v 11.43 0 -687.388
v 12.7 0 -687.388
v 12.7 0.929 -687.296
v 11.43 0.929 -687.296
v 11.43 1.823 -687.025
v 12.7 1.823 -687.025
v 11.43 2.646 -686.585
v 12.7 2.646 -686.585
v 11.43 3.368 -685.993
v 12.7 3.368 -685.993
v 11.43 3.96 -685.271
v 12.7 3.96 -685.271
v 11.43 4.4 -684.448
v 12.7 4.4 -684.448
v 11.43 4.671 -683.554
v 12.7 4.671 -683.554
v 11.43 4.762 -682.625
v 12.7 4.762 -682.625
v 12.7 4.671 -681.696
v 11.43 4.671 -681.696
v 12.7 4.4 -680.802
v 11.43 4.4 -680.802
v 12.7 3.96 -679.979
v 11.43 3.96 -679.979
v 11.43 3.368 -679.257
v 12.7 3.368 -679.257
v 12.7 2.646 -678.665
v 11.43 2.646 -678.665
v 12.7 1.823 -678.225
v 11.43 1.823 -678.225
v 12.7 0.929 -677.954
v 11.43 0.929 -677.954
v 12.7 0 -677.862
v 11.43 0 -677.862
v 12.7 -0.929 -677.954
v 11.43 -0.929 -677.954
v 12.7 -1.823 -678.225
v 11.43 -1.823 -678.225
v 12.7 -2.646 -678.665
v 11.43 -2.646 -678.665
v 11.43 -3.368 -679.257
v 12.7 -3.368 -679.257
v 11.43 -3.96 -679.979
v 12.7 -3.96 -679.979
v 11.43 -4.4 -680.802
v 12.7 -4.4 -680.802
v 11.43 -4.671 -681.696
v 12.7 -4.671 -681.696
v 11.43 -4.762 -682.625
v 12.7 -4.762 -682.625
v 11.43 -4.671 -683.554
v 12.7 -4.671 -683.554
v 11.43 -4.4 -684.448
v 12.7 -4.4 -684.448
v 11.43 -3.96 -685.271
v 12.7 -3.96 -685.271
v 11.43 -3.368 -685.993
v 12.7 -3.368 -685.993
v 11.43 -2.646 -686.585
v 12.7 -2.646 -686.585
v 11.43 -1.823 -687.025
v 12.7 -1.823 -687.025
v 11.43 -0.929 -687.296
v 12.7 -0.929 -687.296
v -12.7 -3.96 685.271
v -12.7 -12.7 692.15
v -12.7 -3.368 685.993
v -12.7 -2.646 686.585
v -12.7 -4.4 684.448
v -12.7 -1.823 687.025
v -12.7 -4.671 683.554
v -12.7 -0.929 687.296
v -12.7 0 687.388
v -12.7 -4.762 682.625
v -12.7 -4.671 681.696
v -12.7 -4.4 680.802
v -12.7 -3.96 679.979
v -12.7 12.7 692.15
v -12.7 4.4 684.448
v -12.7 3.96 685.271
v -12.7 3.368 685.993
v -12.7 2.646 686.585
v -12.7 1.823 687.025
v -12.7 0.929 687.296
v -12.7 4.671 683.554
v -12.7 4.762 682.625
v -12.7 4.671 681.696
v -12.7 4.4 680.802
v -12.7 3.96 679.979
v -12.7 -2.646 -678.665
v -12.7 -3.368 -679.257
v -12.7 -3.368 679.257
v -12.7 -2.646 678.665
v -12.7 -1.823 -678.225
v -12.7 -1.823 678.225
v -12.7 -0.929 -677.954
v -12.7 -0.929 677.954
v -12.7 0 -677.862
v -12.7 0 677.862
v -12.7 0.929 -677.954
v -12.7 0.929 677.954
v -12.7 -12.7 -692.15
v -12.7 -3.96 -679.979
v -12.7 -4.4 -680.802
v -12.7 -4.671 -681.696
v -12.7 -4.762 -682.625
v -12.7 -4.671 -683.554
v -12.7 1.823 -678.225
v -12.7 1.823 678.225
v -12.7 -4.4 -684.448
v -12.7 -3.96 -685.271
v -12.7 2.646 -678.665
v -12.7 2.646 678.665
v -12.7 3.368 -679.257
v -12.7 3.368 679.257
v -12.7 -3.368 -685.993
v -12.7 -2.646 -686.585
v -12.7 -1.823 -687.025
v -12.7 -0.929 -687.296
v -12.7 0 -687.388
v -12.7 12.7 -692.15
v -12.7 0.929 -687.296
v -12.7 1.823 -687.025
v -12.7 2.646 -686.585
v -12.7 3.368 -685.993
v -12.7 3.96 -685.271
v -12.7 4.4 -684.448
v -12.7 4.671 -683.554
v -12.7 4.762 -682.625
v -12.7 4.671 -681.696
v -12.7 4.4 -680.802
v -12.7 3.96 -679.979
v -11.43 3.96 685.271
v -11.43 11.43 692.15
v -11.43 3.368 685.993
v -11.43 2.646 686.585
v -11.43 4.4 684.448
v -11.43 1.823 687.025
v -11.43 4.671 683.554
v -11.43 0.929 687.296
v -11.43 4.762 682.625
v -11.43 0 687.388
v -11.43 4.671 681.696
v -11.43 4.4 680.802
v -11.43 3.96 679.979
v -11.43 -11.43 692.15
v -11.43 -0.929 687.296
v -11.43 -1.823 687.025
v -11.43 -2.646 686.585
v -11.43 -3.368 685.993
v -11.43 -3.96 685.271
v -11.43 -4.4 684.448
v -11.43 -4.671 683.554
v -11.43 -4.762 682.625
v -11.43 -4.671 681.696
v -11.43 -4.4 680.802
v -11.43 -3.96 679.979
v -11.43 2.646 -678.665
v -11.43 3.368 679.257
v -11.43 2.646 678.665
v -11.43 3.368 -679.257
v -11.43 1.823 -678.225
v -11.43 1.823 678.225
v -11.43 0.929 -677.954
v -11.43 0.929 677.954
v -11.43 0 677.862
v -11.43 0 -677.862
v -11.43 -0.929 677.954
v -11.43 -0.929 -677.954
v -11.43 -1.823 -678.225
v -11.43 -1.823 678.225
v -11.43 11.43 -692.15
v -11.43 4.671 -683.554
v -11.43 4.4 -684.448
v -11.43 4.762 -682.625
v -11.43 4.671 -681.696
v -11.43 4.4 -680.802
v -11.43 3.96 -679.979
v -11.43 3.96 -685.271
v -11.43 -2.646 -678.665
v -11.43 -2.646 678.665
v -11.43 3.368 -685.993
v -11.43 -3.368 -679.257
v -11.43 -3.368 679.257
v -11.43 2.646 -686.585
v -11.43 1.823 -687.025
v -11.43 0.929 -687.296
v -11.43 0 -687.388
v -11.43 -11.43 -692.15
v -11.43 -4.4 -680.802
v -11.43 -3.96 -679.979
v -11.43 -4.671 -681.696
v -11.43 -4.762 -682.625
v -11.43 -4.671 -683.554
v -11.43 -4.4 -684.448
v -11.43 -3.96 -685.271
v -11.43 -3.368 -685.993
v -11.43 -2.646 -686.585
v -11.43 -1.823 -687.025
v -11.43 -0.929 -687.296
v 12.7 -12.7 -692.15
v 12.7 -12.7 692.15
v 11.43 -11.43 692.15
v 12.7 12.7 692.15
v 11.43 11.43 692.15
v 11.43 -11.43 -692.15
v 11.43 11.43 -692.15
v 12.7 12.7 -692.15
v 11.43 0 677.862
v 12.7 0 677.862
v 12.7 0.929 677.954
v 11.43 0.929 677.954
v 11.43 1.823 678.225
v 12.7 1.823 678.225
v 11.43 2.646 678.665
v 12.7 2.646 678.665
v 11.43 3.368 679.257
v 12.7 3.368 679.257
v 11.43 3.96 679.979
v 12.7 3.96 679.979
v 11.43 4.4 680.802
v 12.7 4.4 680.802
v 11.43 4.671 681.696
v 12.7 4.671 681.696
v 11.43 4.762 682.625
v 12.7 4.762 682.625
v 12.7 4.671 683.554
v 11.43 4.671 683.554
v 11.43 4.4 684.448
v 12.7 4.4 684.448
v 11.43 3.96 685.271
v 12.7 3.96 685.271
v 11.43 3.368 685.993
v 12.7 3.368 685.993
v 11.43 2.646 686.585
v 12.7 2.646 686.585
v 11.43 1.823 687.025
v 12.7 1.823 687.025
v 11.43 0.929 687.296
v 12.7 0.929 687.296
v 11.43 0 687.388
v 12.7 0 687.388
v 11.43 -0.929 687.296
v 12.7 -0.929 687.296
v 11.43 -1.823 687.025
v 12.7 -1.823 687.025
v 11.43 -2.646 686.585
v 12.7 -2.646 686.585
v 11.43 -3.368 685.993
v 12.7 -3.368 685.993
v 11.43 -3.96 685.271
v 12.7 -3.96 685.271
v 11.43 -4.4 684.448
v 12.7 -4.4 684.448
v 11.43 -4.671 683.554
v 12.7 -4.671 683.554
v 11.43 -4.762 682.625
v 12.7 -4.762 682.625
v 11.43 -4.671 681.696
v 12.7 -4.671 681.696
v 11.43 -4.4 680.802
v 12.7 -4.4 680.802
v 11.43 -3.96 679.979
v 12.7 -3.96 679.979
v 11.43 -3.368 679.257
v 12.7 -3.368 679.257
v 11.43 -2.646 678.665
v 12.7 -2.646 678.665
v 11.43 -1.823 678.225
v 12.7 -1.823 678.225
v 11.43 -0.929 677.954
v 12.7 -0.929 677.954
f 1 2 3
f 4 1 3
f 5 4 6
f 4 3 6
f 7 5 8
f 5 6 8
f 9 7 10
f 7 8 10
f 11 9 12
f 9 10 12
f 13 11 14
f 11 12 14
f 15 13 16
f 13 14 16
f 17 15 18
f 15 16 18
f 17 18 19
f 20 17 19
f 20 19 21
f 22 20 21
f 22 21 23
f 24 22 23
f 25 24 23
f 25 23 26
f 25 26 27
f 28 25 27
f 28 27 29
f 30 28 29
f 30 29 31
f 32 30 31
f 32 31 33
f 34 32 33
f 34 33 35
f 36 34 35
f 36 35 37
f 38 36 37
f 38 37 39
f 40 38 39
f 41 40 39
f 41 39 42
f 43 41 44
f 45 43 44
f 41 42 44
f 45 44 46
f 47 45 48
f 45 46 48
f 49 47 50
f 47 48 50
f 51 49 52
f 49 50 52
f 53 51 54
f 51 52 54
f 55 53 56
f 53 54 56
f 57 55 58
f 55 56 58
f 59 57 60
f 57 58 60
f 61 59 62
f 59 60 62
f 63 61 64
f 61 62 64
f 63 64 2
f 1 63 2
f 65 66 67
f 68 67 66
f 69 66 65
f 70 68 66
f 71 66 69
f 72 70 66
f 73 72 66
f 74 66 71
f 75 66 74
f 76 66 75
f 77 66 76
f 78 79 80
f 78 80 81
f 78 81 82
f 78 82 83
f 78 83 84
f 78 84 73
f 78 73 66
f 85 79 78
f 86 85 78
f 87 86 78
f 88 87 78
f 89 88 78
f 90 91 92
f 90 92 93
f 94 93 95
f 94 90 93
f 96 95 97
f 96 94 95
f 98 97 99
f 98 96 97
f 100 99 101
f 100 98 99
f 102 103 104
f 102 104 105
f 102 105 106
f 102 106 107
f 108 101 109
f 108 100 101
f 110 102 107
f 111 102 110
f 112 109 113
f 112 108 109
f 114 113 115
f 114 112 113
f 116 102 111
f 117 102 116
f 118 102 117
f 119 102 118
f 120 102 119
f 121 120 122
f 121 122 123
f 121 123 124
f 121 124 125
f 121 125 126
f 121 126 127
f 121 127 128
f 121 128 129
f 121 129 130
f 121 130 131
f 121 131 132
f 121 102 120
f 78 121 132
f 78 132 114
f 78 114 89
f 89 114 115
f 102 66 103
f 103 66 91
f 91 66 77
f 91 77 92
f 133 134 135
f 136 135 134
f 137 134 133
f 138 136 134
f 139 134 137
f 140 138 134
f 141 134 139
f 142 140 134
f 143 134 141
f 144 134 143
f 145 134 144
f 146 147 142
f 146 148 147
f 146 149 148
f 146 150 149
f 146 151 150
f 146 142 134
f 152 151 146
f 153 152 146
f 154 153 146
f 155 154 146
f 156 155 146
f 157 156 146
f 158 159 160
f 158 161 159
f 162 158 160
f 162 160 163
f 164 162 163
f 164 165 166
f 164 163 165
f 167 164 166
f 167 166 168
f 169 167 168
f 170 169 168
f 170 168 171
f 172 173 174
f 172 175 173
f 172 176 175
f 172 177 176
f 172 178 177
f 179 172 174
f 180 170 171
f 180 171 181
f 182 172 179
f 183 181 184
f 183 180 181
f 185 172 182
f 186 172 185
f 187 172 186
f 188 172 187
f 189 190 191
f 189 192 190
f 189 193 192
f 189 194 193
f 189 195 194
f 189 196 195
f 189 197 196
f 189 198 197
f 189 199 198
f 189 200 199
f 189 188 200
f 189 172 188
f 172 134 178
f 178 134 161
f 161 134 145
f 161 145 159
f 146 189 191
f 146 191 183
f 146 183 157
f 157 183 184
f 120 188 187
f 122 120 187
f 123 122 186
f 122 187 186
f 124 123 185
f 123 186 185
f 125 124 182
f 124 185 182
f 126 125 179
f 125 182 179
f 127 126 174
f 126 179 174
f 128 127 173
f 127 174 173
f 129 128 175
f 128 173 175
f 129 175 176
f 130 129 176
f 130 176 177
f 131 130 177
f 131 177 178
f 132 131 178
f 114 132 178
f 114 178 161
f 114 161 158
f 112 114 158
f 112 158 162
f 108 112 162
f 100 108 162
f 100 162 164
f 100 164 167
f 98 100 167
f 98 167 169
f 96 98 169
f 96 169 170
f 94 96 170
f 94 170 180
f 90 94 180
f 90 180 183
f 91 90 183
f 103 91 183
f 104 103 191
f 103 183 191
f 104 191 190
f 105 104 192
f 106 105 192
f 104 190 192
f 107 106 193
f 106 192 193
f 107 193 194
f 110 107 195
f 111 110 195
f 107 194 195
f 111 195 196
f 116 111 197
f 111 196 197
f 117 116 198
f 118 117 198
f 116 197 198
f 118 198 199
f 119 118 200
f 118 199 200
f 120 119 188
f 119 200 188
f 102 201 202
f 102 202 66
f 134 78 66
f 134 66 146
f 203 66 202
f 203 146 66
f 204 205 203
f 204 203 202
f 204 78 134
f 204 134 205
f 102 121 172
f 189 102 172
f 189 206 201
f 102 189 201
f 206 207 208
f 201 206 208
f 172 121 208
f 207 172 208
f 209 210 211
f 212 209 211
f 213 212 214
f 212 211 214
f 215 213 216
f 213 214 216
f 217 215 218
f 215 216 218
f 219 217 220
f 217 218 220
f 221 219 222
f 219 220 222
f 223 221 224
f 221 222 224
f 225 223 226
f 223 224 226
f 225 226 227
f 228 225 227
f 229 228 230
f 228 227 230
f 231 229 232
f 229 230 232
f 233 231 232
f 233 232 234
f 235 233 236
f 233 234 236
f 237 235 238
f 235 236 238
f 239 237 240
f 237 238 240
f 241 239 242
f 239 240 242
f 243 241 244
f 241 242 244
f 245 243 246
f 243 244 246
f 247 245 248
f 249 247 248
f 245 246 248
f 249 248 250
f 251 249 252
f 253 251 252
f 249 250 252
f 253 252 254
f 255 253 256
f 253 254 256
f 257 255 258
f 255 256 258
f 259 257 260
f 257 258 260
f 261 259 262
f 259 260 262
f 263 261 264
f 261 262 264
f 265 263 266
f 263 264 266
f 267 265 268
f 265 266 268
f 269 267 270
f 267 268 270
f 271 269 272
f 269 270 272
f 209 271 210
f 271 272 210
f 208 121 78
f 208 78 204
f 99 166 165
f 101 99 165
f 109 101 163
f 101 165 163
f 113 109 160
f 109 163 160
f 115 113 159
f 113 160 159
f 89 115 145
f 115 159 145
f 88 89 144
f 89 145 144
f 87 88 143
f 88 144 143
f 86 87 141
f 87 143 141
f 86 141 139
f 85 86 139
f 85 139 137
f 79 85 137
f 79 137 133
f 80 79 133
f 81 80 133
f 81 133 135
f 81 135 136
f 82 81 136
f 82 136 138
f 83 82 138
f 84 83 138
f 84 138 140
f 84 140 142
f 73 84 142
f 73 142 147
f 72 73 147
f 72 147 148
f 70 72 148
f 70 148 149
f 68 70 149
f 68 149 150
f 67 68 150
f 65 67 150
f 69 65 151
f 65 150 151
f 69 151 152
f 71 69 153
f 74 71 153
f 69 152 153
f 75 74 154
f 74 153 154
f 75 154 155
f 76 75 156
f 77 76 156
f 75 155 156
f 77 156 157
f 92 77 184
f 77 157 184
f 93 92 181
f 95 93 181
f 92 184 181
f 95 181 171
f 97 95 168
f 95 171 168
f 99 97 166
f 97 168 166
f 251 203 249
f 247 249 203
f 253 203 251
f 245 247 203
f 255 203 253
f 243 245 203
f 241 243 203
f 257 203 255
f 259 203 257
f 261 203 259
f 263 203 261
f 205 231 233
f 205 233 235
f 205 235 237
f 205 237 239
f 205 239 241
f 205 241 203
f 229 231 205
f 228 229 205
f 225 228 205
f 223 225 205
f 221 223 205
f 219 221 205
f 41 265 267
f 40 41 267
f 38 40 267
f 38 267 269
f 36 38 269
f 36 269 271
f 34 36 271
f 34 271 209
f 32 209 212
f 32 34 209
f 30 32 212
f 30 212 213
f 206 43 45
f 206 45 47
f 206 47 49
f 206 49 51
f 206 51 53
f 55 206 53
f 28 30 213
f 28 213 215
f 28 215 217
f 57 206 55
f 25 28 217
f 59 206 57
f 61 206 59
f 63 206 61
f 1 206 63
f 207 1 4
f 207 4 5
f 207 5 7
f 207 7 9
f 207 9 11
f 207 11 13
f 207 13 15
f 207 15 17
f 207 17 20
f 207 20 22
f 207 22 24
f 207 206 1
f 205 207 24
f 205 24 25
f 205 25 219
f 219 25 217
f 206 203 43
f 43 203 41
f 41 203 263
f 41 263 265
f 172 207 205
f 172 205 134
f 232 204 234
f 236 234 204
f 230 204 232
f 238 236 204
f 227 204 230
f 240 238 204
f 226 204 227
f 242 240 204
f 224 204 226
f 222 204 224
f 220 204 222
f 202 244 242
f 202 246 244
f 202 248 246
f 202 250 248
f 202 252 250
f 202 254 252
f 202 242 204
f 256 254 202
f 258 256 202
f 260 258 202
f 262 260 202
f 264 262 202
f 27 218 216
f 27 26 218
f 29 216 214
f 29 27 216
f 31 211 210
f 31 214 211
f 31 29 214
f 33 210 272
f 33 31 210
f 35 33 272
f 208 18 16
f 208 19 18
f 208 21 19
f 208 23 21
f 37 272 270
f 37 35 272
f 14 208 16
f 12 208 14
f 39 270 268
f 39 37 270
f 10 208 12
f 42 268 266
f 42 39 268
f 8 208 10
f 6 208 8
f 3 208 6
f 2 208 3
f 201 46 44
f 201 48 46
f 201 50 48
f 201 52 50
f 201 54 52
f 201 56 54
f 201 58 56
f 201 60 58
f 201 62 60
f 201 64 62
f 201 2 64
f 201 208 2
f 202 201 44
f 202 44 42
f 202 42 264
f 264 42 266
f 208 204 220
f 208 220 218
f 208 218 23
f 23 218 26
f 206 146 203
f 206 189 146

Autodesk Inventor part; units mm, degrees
ref_plane "YZ Plane" through (0, 0, 0) normal (1, 0, 0) x (0, 1, 0)
ref_plane "XZ Plane" through (0, 0, 0) normal (0, 1, 0) x (-1, 0, 0)
ref_plane "XY Plane" through (0, 0, 0) normal (0, 0, 1) x (1, 0, 0)
sketch "Sketch1" plane through (0, 0, 0) normal (0, 0, 1) x (1, 0, 0)
  line L0 (-12.7, 12.7) -> (12.7, 12.7)
  line L1 (12.7, 12.7) -> (12.7, -12.7)
  line L2 (12.7, -12.7) -> (-12.7, -12.7)
  line L3 (-12.7, -12.7) -> (-12.7, 12.7)
  line L4 (-17.78, 0) -> (17.78, 0) projected
  line L5 (0, 17.78) -> (0, -17.78) projected
  line L6 (11.43, 11.43) -> (-11.43, 11.43)
  line L7 (-11.43, 11.43) -> (-11.43, -11.43)
  line L8 (-11.43, -11.43) -> (11.43, -11.43)
  line L9 (11.43, -11.43) -> (11.43, 11.43)
  point P0 (0, 0)
  dimension "d0" = 25.4
  dimension "d1" = 1.27
extrude "Extrusion1" add sketch "Sketch1" along normal mid plane 1384.3 contours L0 L5 L6 L7 L4 L3 | L0 L1 L4 L9 L6 L5 | L4 L7 L8 L5 L2 L3 | L1 L2 L5 L8 L9 L4
sketch "Sketch2" plane through (12.7, 12.7, 692.15) normal (1, 0, 0) x (0, 0, -1)
  line L0 (0, 0) -> (1384.3, 0) projected
  line L1 (0, -25.4) -> (0, 0) projected
  line L2 (0, -25.4) -> (1384.3, -25.4) projected
  line L3 (1384.3, 0) -> (1384.3, -25.4) projected
  circle A0 centre (9.525, -12.7) radius 4.7625
  circle A1 centre (1374.775, -12.7) radius 4.7625
  line L4 (692.15, -30.48) -> (692.15, 5.08) projected
  point P0 (692.15, -12.7)
  dimension "d4" = 9.525
  dimension "d5" = 9.525
  dimension "d6" = 12.7
extrude "Extrusion2" cut sketch "Sketch2" against normal up to surface (25.4 mm away) contours A0 | A1
equation "\"d2\" = ArmLength"
equation "\"d7\" = ArmLength"
equation "\"ArmLength\" = 1384.3"
properties part number "Arm" material "Brass, Soft Yellow"
